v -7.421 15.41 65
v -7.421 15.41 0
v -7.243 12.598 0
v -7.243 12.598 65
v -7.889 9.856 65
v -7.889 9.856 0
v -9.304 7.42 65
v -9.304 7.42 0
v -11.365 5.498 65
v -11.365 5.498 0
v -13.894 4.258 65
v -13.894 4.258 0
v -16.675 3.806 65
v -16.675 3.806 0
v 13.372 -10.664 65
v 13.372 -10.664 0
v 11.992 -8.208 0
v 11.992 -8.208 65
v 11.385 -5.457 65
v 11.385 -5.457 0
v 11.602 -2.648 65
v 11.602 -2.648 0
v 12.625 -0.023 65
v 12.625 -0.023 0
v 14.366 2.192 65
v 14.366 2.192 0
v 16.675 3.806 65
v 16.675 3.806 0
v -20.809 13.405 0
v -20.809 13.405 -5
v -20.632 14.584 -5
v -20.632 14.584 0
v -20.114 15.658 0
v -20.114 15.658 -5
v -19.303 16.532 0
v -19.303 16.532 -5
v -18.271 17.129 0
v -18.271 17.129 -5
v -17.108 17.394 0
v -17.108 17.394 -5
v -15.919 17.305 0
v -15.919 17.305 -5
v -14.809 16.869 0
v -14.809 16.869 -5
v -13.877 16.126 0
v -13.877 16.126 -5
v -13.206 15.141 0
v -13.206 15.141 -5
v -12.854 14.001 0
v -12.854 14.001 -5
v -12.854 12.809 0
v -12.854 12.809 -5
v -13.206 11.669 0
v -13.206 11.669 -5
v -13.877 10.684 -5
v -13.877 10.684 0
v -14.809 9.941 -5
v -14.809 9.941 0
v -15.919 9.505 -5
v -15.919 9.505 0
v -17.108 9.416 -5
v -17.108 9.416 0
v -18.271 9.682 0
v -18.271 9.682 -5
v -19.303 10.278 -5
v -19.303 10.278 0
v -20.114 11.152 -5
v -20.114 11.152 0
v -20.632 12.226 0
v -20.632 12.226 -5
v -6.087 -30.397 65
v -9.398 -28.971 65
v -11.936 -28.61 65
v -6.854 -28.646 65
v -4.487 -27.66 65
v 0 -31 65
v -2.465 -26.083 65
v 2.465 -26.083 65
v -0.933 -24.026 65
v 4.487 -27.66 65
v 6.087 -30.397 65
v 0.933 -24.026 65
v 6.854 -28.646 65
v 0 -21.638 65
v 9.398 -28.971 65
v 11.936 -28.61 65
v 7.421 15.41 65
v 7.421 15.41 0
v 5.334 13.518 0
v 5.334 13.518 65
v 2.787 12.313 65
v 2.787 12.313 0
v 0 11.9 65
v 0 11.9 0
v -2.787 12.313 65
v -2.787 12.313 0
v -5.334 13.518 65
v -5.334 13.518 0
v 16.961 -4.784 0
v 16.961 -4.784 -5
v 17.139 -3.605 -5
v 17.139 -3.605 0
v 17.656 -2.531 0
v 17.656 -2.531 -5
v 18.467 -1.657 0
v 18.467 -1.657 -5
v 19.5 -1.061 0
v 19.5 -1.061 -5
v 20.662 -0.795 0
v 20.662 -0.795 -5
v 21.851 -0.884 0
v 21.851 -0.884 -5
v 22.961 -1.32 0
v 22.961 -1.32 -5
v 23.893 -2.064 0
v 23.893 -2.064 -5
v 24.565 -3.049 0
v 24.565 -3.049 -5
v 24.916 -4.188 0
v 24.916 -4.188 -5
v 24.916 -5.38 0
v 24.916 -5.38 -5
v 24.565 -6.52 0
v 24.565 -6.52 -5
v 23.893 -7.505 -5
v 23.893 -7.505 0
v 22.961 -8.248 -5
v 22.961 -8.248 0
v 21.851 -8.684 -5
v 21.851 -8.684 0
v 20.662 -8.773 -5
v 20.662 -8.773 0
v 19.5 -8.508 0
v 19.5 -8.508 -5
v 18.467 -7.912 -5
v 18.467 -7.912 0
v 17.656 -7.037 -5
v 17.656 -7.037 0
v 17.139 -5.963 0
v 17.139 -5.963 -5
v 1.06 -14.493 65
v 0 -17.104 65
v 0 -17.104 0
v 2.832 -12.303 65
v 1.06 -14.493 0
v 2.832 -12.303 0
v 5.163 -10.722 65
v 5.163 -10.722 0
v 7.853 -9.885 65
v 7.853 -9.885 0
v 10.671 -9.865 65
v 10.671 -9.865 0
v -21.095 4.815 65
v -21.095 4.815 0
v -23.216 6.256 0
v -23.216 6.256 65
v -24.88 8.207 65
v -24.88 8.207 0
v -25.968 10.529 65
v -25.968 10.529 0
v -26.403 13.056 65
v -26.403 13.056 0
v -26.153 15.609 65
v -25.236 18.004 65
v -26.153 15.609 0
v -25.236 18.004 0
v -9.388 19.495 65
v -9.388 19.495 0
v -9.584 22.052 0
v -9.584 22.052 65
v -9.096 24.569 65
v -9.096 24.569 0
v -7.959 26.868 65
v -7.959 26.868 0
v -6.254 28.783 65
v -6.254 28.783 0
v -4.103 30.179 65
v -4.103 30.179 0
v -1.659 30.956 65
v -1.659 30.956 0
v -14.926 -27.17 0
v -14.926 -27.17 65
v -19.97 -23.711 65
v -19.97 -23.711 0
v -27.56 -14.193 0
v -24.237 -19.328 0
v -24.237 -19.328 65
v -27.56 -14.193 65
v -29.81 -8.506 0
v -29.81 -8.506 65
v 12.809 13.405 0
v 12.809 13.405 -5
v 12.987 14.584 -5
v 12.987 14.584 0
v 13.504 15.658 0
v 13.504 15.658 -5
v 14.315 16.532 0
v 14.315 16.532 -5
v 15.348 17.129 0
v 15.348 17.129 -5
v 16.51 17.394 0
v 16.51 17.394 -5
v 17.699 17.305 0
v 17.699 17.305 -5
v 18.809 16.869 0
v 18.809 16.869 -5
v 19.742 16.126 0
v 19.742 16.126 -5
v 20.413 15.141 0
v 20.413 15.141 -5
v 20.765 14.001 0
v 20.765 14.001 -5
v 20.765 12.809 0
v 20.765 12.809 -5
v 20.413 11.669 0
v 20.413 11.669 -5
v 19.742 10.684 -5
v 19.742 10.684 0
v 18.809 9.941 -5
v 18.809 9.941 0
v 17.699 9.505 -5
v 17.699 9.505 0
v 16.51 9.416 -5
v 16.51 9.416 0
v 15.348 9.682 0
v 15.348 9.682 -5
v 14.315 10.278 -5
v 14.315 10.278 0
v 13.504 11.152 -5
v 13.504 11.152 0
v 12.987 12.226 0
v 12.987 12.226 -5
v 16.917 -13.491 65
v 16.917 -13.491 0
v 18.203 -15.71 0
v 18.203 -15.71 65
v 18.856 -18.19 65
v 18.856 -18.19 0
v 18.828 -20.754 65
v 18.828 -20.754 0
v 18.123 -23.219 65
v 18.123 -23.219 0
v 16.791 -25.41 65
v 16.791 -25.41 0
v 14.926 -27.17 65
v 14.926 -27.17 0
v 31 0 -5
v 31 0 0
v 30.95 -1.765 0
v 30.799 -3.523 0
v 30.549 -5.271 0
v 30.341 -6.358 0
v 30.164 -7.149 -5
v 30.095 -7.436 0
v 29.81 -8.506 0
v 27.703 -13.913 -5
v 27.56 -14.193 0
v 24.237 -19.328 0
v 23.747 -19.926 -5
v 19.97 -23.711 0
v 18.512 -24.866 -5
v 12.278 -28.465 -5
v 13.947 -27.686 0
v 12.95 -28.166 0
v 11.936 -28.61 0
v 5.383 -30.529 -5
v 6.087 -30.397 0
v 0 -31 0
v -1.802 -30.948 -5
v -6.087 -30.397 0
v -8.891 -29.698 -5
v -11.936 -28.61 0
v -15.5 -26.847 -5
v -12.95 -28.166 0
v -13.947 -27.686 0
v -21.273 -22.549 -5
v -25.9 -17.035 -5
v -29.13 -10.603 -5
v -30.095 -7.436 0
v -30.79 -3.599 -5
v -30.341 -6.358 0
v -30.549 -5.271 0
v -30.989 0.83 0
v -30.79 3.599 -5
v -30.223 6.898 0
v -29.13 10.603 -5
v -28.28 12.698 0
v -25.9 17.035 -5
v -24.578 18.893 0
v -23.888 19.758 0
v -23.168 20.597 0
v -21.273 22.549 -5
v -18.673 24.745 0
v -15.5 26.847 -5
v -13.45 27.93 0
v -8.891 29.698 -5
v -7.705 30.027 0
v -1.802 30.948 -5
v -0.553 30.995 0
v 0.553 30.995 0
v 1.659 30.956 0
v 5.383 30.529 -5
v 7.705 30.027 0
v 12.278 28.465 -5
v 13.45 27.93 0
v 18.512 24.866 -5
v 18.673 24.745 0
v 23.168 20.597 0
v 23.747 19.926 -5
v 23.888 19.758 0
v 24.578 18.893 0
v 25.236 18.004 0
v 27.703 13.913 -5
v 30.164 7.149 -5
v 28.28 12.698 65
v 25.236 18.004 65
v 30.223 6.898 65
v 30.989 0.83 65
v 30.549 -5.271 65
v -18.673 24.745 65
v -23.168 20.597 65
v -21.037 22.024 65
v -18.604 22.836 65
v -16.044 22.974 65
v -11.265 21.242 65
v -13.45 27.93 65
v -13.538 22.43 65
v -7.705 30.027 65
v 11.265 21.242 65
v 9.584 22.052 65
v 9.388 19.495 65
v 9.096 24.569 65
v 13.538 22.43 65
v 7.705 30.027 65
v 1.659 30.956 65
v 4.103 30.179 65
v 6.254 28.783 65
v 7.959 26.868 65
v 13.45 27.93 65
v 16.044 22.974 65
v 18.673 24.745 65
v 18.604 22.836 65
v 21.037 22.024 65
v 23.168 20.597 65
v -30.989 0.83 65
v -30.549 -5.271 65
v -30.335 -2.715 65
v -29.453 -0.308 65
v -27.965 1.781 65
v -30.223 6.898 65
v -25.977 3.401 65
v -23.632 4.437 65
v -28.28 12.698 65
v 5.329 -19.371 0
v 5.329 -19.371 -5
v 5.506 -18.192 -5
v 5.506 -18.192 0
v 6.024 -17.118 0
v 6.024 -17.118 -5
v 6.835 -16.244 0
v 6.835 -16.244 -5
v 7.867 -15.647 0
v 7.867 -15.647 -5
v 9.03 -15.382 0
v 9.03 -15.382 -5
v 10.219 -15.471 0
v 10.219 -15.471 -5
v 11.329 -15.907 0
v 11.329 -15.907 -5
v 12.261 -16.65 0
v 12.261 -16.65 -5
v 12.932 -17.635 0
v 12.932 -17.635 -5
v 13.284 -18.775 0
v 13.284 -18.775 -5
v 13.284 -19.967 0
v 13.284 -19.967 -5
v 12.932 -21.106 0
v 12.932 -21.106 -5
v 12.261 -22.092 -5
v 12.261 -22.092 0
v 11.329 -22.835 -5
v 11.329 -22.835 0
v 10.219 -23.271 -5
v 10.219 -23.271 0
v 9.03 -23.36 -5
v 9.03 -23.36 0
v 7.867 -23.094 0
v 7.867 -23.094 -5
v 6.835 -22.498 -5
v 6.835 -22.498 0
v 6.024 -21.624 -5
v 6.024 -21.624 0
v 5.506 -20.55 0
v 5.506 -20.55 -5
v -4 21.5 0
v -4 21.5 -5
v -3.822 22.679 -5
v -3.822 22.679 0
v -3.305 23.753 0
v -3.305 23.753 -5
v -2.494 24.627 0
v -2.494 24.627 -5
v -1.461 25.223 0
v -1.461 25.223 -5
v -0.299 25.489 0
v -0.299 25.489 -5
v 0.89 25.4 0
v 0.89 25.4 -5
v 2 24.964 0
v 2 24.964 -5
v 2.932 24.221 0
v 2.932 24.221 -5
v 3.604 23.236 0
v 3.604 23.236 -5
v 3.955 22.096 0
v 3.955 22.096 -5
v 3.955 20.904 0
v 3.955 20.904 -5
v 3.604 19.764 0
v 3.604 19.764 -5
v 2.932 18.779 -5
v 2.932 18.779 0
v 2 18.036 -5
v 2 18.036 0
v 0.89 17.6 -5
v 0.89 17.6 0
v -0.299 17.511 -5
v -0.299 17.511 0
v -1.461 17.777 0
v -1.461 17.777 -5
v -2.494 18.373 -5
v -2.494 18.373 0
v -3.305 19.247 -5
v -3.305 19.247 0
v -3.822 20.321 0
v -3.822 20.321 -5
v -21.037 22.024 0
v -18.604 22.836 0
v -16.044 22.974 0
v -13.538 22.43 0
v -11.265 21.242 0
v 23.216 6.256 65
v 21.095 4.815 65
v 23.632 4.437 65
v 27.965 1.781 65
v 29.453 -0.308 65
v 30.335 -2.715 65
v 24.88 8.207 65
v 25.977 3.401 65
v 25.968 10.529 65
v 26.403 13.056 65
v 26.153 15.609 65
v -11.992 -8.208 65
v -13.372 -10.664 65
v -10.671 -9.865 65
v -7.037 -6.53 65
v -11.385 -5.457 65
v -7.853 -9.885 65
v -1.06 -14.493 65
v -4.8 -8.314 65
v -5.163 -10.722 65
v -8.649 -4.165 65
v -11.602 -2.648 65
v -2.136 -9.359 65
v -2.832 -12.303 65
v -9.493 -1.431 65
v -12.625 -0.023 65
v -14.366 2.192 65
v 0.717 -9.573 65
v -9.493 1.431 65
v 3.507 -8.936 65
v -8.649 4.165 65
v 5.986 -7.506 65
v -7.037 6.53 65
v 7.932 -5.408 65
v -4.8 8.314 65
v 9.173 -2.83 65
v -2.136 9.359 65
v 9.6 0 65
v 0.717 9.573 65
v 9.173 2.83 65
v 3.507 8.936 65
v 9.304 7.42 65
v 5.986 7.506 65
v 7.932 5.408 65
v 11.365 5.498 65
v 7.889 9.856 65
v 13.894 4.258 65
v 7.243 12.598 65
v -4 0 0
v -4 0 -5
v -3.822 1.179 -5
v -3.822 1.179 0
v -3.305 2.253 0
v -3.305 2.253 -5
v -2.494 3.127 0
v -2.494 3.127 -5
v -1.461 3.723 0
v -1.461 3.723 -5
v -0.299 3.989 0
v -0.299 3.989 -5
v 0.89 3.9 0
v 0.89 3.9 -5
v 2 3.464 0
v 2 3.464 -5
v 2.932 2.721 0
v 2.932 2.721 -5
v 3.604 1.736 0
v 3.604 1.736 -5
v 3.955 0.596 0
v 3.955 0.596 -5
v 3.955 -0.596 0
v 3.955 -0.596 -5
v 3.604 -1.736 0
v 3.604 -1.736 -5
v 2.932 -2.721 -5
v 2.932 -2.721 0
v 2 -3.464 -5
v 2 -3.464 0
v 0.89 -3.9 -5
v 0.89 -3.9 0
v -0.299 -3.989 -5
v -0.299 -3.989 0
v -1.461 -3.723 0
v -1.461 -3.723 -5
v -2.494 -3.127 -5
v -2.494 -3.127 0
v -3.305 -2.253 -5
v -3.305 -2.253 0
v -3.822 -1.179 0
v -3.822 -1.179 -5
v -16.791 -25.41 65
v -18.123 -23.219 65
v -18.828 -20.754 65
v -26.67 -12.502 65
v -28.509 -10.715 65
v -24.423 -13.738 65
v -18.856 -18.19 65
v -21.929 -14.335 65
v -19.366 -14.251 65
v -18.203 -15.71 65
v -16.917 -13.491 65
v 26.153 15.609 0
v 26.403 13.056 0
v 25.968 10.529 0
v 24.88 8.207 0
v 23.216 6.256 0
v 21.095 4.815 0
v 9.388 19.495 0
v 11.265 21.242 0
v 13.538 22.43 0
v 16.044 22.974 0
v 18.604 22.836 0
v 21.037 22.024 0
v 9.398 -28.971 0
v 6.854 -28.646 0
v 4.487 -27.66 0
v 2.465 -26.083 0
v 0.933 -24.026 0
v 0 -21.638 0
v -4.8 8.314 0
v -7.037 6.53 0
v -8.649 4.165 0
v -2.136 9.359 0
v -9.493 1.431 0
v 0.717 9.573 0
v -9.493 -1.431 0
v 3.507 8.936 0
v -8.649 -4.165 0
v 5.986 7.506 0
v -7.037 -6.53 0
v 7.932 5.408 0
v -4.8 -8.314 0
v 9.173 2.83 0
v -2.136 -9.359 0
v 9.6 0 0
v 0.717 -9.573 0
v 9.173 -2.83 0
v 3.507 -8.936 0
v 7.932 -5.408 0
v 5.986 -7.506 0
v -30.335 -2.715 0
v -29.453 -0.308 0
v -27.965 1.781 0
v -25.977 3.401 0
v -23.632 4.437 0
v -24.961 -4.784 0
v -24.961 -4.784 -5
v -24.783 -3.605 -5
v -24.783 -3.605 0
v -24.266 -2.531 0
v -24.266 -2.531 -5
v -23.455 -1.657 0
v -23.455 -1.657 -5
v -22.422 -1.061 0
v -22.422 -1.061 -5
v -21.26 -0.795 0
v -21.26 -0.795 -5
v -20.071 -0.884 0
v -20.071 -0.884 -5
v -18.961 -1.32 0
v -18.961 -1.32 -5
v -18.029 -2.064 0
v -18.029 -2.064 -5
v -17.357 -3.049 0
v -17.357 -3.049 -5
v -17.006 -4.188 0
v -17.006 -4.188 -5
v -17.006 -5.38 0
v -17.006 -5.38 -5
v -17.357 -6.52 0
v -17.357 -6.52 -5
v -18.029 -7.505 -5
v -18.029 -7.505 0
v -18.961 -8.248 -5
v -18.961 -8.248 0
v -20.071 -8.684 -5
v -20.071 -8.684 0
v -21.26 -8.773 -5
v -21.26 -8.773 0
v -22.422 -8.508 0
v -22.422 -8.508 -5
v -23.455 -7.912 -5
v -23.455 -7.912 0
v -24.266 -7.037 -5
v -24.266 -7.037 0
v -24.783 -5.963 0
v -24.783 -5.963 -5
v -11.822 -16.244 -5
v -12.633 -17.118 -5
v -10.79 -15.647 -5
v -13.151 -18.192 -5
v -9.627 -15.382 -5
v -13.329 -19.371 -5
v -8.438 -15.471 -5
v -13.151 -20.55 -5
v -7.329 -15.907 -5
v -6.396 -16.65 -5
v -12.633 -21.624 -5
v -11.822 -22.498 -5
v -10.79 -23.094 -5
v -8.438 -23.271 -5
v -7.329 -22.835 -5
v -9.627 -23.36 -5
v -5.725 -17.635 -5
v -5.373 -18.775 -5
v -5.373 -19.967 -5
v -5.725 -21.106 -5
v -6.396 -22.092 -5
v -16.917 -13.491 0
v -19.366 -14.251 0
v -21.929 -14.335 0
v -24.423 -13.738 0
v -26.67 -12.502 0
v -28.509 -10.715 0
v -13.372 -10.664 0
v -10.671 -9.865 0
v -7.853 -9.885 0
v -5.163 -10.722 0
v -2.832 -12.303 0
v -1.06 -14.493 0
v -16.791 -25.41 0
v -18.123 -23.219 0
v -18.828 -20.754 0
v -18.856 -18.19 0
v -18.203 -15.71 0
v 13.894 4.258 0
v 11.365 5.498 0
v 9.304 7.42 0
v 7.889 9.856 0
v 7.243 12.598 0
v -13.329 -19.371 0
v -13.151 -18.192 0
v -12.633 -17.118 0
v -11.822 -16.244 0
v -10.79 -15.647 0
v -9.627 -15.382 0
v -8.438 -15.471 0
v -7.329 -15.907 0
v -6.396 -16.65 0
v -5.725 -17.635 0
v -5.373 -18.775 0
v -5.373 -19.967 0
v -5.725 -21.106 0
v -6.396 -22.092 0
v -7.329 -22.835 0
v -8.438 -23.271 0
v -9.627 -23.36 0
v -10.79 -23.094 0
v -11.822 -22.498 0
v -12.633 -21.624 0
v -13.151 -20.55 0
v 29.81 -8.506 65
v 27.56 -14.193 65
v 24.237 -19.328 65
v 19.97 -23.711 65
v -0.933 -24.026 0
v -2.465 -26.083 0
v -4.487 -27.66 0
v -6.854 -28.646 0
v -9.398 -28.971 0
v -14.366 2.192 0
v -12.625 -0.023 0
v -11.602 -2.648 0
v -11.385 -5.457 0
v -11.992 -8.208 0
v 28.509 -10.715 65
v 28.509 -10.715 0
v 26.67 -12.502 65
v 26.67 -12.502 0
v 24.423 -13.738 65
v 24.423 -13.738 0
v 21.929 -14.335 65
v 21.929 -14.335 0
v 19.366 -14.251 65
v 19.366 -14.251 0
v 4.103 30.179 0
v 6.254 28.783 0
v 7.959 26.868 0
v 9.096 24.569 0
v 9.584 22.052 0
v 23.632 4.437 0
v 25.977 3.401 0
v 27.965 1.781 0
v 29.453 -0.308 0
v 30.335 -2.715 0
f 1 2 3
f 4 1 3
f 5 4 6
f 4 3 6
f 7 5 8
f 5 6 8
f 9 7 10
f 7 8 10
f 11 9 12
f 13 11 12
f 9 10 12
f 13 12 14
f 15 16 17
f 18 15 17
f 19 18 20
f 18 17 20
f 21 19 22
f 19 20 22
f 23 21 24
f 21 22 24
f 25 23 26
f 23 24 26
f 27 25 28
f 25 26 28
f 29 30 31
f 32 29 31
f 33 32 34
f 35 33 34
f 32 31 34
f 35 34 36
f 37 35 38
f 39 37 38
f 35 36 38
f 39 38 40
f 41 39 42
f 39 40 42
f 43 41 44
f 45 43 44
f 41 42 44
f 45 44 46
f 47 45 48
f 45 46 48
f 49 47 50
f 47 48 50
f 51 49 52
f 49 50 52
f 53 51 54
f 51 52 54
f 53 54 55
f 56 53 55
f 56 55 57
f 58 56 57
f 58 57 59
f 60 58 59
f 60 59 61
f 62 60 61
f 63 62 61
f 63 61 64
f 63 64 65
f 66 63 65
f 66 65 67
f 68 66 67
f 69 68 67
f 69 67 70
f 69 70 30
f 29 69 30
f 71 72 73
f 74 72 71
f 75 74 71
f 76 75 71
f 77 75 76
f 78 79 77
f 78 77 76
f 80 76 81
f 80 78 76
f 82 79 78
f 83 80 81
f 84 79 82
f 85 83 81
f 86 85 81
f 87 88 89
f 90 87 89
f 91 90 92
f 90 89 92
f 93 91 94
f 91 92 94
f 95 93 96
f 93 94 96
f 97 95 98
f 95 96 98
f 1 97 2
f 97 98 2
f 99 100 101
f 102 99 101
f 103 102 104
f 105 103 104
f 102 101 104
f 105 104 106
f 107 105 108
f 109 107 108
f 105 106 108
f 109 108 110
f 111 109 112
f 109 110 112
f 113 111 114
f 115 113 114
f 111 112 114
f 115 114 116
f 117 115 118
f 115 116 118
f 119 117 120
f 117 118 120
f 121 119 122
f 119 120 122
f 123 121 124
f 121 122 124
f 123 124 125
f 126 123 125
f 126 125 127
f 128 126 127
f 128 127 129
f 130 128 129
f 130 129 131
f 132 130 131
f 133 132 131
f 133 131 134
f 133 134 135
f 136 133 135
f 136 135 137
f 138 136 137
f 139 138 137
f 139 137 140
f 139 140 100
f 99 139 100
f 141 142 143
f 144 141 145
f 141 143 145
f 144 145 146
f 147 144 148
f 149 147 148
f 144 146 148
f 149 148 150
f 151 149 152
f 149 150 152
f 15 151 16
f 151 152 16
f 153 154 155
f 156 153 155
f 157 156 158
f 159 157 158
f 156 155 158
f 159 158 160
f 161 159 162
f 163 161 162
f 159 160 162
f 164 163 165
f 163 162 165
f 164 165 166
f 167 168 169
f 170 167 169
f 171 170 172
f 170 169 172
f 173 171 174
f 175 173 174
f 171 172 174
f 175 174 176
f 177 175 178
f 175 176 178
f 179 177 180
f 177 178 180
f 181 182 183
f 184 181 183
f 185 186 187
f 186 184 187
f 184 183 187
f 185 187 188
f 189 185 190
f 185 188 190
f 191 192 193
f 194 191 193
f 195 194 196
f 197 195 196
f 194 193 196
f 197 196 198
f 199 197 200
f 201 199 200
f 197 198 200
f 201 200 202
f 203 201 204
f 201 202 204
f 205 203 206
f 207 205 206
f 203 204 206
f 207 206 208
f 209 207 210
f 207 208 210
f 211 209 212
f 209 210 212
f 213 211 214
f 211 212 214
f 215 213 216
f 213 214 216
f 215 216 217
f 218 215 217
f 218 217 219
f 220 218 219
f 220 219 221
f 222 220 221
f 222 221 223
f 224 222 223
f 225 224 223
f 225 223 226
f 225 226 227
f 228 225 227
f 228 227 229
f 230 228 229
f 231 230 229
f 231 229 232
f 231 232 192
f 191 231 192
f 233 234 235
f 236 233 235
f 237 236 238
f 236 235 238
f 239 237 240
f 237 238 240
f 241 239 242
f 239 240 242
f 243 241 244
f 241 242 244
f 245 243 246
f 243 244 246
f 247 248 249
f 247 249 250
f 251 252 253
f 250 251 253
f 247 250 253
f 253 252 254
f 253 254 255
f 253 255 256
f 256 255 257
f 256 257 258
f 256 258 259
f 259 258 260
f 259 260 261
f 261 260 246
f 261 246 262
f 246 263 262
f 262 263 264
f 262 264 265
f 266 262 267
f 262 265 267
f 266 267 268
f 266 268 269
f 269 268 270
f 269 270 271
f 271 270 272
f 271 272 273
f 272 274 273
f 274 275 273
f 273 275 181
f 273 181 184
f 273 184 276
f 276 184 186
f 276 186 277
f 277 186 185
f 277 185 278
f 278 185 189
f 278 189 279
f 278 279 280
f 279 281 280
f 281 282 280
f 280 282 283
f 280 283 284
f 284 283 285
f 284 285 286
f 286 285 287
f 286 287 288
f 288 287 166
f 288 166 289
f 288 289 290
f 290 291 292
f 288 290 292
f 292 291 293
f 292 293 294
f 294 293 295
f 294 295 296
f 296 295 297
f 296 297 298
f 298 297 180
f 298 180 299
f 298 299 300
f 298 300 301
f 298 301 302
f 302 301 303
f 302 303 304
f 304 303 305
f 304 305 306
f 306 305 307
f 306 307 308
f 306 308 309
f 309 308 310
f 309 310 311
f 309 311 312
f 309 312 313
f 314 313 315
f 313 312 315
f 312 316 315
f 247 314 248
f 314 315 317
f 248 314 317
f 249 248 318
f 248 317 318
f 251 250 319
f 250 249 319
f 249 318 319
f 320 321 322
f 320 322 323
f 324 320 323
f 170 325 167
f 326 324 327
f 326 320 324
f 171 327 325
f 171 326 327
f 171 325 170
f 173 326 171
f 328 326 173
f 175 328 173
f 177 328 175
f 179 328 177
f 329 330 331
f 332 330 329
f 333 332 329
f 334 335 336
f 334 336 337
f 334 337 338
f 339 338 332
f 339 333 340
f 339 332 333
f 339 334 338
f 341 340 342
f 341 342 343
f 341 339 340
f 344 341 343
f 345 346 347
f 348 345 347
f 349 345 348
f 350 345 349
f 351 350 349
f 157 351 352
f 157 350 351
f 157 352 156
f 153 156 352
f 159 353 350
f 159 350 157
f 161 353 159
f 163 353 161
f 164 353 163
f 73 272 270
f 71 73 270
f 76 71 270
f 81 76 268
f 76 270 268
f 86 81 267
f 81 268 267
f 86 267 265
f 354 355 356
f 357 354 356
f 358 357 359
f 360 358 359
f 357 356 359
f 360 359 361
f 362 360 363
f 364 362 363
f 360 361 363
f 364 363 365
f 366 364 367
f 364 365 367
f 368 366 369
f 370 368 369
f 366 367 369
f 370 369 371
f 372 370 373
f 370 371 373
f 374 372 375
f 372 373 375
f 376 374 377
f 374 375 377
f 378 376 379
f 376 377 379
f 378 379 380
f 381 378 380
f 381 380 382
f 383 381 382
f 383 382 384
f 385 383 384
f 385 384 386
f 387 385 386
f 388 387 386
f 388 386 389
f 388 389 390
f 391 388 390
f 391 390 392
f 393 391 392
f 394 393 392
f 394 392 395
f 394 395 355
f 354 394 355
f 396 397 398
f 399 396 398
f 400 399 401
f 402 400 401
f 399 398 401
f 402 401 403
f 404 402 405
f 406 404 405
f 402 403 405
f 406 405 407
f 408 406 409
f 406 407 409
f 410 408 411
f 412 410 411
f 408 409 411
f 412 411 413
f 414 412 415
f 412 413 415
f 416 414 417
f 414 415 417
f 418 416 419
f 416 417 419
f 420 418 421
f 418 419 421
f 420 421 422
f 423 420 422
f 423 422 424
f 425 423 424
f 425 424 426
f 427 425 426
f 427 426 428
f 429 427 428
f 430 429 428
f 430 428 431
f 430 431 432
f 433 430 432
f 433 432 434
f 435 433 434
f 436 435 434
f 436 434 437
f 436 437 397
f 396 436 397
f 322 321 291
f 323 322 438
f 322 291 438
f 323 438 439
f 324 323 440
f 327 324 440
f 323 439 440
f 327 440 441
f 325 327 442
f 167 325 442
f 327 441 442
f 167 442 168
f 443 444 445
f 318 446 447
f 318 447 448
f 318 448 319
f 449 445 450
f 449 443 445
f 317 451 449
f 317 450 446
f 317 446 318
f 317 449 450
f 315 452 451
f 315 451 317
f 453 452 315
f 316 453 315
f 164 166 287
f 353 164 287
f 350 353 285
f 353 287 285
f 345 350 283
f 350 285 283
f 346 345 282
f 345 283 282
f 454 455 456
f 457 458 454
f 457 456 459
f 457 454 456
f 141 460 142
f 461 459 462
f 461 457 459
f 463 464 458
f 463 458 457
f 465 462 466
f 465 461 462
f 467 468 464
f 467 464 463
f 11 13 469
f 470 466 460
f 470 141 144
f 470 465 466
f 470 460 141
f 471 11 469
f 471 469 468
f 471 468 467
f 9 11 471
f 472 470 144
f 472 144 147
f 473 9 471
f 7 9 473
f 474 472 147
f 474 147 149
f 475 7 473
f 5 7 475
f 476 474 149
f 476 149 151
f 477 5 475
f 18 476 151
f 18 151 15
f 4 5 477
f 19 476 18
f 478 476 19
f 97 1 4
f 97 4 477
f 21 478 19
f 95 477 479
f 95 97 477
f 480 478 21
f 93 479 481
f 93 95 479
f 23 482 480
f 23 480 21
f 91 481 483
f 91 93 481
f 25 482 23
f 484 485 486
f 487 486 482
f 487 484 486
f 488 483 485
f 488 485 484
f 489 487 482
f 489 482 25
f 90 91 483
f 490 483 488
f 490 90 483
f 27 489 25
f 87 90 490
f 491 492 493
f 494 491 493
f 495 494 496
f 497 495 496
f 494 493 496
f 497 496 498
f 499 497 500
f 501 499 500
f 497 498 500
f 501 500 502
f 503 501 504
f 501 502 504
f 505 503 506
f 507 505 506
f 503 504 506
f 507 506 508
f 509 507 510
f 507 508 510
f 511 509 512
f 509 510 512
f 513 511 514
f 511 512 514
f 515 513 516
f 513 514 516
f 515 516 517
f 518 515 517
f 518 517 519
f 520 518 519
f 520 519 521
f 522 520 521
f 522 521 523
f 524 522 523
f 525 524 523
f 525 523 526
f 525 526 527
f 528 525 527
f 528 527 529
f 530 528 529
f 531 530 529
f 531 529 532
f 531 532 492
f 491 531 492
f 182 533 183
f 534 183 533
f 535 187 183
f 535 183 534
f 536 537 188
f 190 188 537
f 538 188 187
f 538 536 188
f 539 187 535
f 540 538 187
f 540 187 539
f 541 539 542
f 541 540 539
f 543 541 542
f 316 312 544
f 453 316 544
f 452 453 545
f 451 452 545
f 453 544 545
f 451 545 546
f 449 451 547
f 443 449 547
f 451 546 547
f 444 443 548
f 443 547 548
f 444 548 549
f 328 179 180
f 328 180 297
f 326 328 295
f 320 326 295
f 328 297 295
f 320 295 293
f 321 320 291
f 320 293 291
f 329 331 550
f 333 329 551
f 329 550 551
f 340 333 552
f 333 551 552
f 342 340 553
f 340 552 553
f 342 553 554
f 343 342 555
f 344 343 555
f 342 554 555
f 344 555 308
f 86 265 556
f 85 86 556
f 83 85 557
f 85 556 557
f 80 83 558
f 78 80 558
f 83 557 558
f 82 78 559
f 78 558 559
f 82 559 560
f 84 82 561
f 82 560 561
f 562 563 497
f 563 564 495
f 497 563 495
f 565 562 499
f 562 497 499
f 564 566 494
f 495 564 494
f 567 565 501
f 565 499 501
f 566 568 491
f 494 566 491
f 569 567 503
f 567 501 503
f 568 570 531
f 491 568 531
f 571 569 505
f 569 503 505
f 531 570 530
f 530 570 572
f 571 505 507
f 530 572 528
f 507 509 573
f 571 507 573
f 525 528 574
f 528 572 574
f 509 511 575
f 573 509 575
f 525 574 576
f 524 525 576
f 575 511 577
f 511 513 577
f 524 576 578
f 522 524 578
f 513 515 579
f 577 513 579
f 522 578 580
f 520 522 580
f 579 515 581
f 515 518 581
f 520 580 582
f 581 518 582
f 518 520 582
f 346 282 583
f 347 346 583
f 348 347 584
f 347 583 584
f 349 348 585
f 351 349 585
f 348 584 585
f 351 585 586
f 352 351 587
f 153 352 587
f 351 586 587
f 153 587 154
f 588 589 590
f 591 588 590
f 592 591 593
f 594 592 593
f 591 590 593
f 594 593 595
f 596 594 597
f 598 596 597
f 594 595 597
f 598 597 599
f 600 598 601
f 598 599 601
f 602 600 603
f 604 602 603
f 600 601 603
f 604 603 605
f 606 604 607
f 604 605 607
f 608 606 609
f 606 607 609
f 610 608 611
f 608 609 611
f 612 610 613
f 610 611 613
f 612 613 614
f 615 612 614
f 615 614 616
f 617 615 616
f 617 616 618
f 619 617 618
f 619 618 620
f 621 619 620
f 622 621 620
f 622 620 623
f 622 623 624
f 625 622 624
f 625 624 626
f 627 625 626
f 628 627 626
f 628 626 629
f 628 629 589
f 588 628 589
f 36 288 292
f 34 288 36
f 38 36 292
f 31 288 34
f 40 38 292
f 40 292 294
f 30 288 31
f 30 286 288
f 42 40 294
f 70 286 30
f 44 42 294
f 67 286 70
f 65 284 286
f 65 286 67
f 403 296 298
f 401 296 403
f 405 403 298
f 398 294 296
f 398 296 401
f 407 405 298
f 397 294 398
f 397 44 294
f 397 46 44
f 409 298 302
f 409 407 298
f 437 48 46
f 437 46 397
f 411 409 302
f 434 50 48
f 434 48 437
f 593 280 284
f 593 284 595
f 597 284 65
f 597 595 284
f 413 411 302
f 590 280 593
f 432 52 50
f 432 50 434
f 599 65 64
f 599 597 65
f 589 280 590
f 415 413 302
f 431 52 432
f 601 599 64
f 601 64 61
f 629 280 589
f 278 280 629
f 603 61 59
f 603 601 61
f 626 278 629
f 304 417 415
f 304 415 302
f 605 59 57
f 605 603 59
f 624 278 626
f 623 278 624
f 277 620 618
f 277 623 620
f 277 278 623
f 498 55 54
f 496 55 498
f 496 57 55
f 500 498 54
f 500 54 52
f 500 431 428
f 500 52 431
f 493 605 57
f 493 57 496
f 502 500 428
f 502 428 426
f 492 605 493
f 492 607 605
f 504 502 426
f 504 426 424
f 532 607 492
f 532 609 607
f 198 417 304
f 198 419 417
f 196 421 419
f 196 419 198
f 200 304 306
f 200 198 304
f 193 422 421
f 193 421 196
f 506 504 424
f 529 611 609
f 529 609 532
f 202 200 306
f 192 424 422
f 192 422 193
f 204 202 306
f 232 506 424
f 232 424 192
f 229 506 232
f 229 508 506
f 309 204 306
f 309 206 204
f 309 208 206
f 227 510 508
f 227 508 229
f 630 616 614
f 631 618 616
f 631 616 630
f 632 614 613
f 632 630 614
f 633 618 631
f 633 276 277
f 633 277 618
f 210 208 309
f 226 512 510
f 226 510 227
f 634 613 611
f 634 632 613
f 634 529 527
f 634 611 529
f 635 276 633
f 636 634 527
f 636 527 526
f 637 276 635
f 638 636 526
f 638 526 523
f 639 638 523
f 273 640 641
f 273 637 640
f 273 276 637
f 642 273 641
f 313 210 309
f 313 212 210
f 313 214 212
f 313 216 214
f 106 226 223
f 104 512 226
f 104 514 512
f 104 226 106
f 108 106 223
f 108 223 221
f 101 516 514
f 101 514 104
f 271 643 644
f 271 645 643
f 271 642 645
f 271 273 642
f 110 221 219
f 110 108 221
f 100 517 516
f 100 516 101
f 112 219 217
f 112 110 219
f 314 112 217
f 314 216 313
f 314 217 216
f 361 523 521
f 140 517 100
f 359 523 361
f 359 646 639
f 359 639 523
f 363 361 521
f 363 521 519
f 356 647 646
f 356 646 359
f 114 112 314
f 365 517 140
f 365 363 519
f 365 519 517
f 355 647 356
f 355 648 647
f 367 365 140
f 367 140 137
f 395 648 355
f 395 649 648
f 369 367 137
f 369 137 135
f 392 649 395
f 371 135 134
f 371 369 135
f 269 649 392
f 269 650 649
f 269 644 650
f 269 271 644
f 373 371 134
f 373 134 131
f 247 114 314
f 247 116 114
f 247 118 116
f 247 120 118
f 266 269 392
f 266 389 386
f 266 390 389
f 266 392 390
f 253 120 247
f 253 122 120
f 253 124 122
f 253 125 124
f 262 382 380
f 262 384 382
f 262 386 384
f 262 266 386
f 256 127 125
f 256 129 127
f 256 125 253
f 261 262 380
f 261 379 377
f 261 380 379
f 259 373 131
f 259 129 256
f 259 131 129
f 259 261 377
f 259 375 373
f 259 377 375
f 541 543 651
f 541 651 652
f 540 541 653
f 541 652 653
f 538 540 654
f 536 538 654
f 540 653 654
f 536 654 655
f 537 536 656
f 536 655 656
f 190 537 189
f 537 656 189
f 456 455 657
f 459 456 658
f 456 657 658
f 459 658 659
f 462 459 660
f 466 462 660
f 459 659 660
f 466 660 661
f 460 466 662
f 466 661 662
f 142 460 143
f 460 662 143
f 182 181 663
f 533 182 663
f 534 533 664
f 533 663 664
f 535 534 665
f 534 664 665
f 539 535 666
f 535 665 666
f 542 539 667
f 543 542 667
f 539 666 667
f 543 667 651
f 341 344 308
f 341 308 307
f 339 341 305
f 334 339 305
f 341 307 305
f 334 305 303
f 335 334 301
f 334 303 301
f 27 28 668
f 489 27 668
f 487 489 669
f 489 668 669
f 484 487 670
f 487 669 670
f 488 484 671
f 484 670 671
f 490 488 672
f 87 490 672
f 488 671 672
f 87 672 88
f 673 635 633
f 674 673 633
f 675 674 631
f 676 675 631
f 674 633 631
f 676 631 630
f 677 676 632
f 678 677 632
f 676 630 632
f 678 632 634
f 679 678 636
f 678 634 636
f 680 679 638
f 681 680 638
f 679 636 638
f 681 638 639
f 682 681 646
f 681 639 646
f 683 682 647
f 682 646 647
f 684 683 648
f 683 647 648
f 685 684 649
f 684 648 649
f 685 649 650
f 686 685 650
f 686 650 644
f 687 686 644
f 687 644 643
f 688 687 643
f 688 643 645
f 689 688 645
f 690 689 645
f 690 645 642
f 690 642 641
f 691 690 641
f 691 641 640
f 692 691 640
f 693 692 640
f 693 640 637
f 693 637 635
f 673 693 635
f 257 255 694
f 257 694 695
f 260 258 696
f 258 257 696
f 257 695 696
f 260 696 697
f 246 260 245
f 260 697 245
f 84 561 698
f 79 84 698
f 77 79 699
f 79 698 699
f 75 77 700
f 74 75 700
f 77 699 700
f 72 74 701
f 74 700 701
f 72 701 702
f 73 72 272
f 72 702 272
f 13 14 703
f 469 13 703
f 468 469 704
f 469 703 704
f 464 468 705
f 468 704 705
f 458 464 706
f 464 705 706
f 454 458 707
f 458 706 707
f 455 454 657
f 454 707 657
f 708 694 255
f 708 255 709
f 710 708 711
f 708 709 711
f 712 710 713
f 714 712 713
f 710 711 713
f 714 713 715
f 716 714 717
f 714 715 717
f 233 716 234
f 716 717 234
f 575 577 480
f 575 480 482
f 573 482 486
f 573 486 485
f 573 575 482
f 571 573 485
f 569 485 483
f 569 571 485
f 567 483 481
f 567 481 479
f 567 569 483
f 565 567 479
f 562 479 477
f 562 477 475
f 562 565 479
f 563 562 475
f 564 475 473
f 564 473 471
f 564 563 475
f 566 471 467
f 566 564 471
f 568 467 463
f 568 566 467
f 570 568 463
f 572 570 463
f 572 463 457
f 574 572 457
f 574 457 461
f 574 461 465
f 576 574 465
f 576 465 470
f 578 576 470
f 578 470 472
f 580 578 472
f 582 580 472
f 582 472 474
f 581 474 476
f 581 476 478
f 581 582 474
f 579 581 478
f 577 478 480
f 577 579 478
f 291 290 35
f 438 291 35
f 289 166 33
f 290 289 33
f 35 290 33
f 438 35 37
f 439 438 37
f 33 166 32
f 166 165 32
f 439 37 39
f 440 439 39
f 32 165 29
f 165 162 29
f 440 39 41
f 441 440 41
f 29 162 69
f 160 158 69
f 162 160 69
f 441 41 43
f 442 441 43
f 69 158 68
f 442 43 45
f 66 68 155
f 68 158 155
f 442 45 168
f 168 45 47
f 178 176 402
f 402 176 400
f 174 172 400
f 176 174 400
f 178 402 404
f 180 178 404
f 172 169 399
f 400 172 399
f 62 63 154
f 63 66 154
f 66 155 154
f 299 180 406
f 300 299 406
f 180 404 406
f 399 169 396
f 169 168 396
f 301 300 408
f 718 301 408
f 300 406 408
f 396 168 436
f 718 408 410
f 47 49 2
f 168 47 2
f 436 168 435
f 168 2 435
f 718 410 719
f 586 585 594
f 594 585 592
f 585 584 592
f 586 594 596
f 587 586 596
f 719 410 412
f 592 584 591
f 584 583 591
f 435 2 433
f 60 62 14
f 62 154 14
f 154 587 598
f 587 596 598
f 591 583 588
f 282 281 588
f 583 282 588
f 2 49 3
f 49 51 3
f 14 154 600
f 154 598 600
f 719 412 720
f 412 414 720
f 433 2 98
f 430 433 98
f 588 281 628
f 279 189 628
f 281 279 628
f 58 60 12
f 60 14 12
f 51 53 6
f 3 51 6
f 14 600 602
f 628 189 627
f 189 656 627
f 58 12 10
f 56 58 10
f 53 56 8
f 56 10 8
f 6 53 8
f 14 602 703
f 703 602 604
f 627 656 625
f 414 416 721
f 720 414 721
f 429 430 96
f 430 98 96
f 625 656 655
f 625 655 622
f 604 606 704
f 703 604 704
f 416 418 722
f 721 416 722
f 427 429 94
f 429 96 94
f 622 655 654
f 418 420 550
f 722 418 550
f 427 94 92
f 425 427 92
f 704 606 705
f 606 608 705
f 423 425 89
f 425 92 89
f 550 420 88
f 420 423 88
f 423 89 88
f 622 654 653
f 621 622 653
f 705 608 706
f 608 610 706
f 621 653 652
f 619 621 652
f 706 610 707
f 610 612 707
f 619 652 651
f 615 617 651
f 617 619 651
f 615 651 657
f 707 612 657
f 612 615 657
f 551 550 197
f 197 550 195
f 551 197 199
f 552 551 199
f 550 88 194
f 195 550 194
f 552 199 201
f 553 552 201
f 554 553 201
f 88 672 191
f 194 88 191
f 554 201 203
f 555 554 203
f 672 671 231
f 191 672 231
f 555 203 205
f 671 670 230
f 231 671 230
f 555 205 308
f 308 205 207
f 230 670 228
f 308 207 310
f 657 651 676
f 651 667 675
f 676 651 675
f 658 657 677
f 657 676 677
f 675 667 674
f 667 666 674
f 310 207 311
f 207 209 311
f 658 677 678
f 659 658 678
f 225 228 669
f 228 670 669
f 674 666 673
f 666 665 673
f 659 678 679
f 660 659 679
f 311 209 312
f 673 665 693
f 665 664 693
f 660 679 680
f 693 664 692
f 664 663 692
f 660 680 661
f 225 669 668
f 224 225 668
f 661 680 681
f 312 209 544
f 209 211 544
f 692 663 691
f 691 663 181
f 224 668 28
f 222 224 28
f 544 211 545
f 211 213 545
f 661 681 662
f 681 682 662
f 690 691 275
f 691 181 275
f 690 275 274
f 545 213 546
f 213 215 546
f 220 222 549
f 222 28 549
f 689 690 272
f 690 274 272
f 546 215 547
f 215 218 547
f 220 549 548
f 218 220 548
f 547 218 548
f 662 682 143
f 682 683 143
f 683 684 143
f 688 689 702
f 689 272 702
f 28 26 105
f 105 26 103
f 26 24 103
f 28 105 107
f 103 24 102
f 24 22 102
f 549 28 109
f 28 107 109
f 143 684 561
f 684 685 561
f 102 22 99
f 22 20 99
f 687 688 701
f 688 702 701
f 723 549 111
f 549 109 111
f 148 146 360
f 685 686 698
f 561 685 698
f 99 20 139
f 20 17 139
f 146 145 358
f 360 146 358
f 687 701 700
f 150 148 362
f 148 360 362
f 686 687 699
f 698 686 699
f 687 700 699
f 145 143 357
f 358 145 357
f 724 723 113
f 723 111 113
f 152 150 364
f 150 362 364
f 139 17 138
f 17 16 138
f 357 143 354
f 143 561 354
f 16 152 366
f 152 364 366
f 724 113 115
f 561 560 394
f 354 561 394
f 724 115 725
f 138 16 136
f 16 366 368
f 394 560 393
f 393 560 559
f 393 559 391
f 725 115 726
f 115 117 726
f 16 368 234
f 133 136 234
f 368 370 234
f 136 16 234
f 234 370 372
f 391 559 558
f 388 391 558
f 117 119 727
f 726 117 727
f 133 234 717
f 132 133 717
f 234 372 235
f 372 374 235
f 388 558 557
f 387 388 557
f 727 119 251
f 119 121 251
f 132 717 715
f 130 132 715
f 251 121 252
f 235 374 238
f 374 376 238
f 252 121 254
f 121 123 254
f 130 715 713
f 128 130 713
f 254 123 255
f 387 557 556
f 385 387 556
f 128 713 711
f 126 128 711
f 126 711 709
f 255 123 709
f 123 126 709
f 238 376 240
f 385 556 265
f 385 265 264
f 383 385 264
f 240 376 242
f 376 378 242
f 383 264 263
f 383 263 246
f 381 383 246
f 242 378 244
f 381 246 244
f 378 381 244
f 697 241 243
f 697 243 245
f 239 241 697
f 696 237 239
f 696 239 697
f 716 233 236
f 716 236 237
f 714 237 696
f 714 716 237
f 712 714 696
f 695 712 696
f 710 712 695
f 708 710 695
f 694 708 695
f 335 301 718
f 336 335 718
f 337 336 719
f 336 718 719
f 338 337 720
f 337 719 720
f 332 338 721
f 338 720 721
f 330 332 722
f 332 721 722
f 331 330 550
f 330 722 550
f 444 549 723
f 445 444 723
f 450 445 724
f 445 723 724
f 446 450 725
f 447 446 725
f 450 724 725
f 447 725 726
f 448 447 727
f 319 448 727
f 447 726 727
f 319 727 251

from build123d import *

# Parameters (mm, degrees)
F1_DEPTH = 65
F0_R     = 9.6
F2_R     = 31
F2_R_2   = 9.6
F3_DEPTH = 5
F5_D     = 8


with BuildPart() as f1:
    # F0 (on Top) → F1 (new body)
    with BuildSketch(Plane.XY):
        with BuildLine():
            ThreePointArc((0, -21.6377846635), (-4.4866514155, -27.6603721731), (-11.936497657, -28.6097889486))
            ThreePointArc((-11.936497657, -28.6097889486), (0, -31), (11.936497657, -28.6097889486))
            ThreePointArc((11.936497657, -28.6097889486), (4.4866514155, -27.6603721731), (0, -21.6377846635))
        make_face()
    extrude(amount=F1_DEPTH)



with BuildPart() as f1b:
    # F0 (on Top) → F1, piece 2 (new body)
    with BuildSketch(Plane.XY):
        with BuildLine():
            ThreePointArc((7.421093957, 15.4100603877), (0, 11.9), (-7.421093957, 15.4100603877))
            ThreePointArc((-7.421093957, 15.4100603877), (-9.3037946414, 7.4195286421), (-16.6750467587, 3.8059706078))
            ThreePointArc((-16.6750467587, 3.8059706078), (-11.601642155, -2.6479991141), (-13.3723492421, -10.6640926674))
            ThreePointArc((-13.3723492421, -10.6640926674), (-5.1632164955, -10.721529528), (0, -17.1038766563))
            ThreePointArc((0, -17.1038766563), (5.1632164955, -10.721529528), (13.3723492421, -10.6640926674))
            ThreePointArc((13.3723492421, -10.6640926674), (11.601642155, -2.6479991141), (16.6750467587, 3.8059706078))
            ThreePointArc((16.6750467587, 3.8059706078), (9.3037946414, 7.4195286421), (7.421093957, 15.4100603877))
        make_face()
        Circle(F0_R, mode=Mode.SUBTRACT)
    extrude(amount=F1_DEPTH)


with BuildPart() as f1c:
    # F0 (on Top) → F1, piece 3 (new body)
    with BuildSketch(Plane.XY):
        with BuildLine():
            ThreePointArc((-23.1677349851, 20.5974769246), (-16.0437189504, 22.9744491102), (-9.388282916, 19.4949703522))
            ThreePointArc((-9.388282916, 19.4949703522), (-7.9590524573, 26.8678192948), (-1.6589094237, 30.9555813953))
            ThreePointArc((-1.6589094237, 30.9555813953), (-13.4503959126, 27.930034905), (-23.1677349851, 20.5974769246))
        make_face()
    extrude(amount=F1_DEPTH)


with BuildPart() as f1d:
    # F0 (on Top) → F1, piece 4 (new body)
    with BuildSketch(Plane.XY):
        with BuildLine():
            ThreePointArc((-30.5486024144, -5.2709477823), (-27.9652427562, 1.7808501523), (-21.0952802263, 4.8148600521))
            ThreePointArc((-21.0952802263, 4.8148600521), (-25.9684950295, 10.5291735468), (-25.2363612008, 18.0035016966))
            ThreePointArc((-25.2363612008, 18.0035016966), (-30.2227652776, 6.8981489526), (-30.5486024144, -5.2709477823))
        make_face()
    extrude(amount=F1_DEPTH)


with BuildPart() as f1e:
    # F0 (on Top) → F1, piece 5 (new body)
    with BuildSketch(Plane.XY):
        with BuildLine():
            ThreePointArc((-14.9257491478, -27.1702413014), (-18.8283683796, -20.7537652931), (-16.9171012608, -13.4909380725))
            ThreePointArc((-16.9171012608, -13.4909380725), (-24.4231311838, -13.738154638), (-29.8103182658, -8.5055819842))
            ThreePointArc((-29.8103182658, -8.5055819842), (-24.2367759565, -19.3281838576), (-14.9257491478, -27.1702413014))
        make_face()
    extrude(amount=F1_DEPTH)


with BuildPart() as f1f:
    # F0 (on Top) → F1, piece 6 (new body)
    with BuildSketch(Plane.XY):
        with BuildLine():
            ThreePointArc((29.8103182658, -8.5055819842), (24.4231311838, -13.738154638), (16.9171012608, -13.4909380725))
            ThreePointArc((16.9171012608, -13.4909380725), (18.8283683796, -20.7537652931), (14.9257491478, -27.1702413014))
            ThreePointArc((14.9257491478, -27.1702413014), (24.2367759565, -19.3281838576), (29.8103182658, -8.5055819842))
        make_face()
    extrude(amount=F1_DEPTH)


with BuildPart() as f1g:
    # F0 (on Top) → F1, piece 7 (new body)
    with BuildSketch(Plane.XY):
        with BuildLine():
            ThreePointArc((25.2363612008, 18.0035016966), (25.9684950295, 10.5291735468), (21.0952802263, 4.8148600521))
            ThreePointArc((21.0952802263, 4.8148600521), (27.9652427562, 1.7808501523), (30.5486024144, -5.2709477823))
            ThreePointArc((30.5486024144, -5.2709477823), (30.2227652776, 6.8981489526), (25.2363612008, 18.0035016966))
        make_face()
    extrude(amount=F1_DEPTH)


with BuildPart() as f1h:
    # F0 (on Top) → F1, piece 8 (new body)
    with BuildSketch(Plane.XY):
        with BuildLine():
            ThreePointArc((1.6589094237, 30.9555813953), (7.9590524573, 26.8678192948), (9.388282916, 19.4949703522))
            ThreePointArc((9.388282916, 19.4949703522), (16.0437189504, 22.9744491102), (23.1677349851, 20.5974769246))
            ThreePointArc((23.1677349851, 20.5974769246), (13.4503959126, 27.930034905), (1.6589094237, 30.9555813953))
        make_face()
    extrude(amount=F1_DEPTH)


with BuildPart() as f1_1:
    add(f1.part)

    add(f1b.part)  # F3 merges F1b

    add(f1c.part)  # F3 merges F1c

    add(f1d.part)  # F3 merges F1d

    add(f1e.part)  # F3 merges F1e

    add(f1f.part)  # F3 merges F1f

    add(f1g.part)  # F3 merges F1g

    add(f1h.part)  # F3 merges F1h
    # F2 (on face) → F3 (join)
    with BuildSketch(Plane(origin=(0, 0, 0), x_dir=(1, 0, 0), z_dir=(0, 0, -1))):
        Circle(F2_R)
        with BuildLine():
            ThreePointArc((-13.3723492421, 10.6640926674), (-5.1632164955, 10.721529528), (0, 17.1038766563))
            ThreePointArc((0, 17.1038766563), (5.1632164955, 10.721529528), (13.3723492421, 10.6640926674))
            ThreePointArc((13.3723492421, 10.6640926674), (11.601642155, 2.6479991141), (16.6750467587, -3.8059706078))
            ThreePointArc((16.6750467587, -3.8059706078), (9.3037946414, -7.4195286421), (7.421093957, -15.4100603877))
            ThreePointArc((7.421093957, -15.4100603877), (0, -11.9), (-7.421093957, -15.4100603877))
            ThreePointArc((-7.421093957, -15.4100603877), (-9.3037946414, -7.4195286421), (-16.6750467587, -3.8059706078))
            ThreePointArc((-16.6750467587, -3.8059706078), (-11.601642155, 2.6479991141), (-13.3723492421, 10.6640926674))
        make_face(mode=Mode.SUBTRACT)
        with BuildLine():
            ThreePointArc((13.3723492421, 10.6640926674), (5.1632164955, 10.721529528), (0, 17.1038766563))
            ThreePointArc((0, 17.1038766563), (-5.1632164955, 10.721529528), (-13.3723492421, 10.6640926674))
            ThreePointArc((-13.3723492421, 10.6640926674), (-11.601642155, 2.6479991141), (-16.6750467587, -3.8059706078))
            ThreePointArc((-16.6750467587, -3.8059706078), (-9.3037946414, -7.4195286421), (-7.421093957, -15.4100603877))
            ThreePointArc((-7.421093957, -15.4100603877), (0, -11.9), (7.421093957, -15.4100603877))
            ThreePointArc((7.421093957, -15.4100603877), (9.3037946414, -7.4195286421), (16.6750467587, -3.8059706078))
            ThreePointArc((16.6750467587, -3.8059706078), (11.601642155, 2.6479991141), (13.3723492421, 10.6640926674))
        make_face()
        Circle(F2_R_2, mode=Mode.SUBTRACT)
        Circle(F2_R_2)
    extrude(amount=F3_DEPTH)

    # F5 (through all)
    with Locations(Plane.XY):
        with Locations((9.328500391, -19.3708306599), (20.9609501119, -4.7842000801), (16.8093768731, 13.40503074), (0, 21.5), (0, 0), (-16.8093768731, 13.40503074), (-20.9609501119, -4.7842000801), (-9.328500391, -19.3708306599)):
            Hole(F5_D / 2)


solid = f1_1.part
